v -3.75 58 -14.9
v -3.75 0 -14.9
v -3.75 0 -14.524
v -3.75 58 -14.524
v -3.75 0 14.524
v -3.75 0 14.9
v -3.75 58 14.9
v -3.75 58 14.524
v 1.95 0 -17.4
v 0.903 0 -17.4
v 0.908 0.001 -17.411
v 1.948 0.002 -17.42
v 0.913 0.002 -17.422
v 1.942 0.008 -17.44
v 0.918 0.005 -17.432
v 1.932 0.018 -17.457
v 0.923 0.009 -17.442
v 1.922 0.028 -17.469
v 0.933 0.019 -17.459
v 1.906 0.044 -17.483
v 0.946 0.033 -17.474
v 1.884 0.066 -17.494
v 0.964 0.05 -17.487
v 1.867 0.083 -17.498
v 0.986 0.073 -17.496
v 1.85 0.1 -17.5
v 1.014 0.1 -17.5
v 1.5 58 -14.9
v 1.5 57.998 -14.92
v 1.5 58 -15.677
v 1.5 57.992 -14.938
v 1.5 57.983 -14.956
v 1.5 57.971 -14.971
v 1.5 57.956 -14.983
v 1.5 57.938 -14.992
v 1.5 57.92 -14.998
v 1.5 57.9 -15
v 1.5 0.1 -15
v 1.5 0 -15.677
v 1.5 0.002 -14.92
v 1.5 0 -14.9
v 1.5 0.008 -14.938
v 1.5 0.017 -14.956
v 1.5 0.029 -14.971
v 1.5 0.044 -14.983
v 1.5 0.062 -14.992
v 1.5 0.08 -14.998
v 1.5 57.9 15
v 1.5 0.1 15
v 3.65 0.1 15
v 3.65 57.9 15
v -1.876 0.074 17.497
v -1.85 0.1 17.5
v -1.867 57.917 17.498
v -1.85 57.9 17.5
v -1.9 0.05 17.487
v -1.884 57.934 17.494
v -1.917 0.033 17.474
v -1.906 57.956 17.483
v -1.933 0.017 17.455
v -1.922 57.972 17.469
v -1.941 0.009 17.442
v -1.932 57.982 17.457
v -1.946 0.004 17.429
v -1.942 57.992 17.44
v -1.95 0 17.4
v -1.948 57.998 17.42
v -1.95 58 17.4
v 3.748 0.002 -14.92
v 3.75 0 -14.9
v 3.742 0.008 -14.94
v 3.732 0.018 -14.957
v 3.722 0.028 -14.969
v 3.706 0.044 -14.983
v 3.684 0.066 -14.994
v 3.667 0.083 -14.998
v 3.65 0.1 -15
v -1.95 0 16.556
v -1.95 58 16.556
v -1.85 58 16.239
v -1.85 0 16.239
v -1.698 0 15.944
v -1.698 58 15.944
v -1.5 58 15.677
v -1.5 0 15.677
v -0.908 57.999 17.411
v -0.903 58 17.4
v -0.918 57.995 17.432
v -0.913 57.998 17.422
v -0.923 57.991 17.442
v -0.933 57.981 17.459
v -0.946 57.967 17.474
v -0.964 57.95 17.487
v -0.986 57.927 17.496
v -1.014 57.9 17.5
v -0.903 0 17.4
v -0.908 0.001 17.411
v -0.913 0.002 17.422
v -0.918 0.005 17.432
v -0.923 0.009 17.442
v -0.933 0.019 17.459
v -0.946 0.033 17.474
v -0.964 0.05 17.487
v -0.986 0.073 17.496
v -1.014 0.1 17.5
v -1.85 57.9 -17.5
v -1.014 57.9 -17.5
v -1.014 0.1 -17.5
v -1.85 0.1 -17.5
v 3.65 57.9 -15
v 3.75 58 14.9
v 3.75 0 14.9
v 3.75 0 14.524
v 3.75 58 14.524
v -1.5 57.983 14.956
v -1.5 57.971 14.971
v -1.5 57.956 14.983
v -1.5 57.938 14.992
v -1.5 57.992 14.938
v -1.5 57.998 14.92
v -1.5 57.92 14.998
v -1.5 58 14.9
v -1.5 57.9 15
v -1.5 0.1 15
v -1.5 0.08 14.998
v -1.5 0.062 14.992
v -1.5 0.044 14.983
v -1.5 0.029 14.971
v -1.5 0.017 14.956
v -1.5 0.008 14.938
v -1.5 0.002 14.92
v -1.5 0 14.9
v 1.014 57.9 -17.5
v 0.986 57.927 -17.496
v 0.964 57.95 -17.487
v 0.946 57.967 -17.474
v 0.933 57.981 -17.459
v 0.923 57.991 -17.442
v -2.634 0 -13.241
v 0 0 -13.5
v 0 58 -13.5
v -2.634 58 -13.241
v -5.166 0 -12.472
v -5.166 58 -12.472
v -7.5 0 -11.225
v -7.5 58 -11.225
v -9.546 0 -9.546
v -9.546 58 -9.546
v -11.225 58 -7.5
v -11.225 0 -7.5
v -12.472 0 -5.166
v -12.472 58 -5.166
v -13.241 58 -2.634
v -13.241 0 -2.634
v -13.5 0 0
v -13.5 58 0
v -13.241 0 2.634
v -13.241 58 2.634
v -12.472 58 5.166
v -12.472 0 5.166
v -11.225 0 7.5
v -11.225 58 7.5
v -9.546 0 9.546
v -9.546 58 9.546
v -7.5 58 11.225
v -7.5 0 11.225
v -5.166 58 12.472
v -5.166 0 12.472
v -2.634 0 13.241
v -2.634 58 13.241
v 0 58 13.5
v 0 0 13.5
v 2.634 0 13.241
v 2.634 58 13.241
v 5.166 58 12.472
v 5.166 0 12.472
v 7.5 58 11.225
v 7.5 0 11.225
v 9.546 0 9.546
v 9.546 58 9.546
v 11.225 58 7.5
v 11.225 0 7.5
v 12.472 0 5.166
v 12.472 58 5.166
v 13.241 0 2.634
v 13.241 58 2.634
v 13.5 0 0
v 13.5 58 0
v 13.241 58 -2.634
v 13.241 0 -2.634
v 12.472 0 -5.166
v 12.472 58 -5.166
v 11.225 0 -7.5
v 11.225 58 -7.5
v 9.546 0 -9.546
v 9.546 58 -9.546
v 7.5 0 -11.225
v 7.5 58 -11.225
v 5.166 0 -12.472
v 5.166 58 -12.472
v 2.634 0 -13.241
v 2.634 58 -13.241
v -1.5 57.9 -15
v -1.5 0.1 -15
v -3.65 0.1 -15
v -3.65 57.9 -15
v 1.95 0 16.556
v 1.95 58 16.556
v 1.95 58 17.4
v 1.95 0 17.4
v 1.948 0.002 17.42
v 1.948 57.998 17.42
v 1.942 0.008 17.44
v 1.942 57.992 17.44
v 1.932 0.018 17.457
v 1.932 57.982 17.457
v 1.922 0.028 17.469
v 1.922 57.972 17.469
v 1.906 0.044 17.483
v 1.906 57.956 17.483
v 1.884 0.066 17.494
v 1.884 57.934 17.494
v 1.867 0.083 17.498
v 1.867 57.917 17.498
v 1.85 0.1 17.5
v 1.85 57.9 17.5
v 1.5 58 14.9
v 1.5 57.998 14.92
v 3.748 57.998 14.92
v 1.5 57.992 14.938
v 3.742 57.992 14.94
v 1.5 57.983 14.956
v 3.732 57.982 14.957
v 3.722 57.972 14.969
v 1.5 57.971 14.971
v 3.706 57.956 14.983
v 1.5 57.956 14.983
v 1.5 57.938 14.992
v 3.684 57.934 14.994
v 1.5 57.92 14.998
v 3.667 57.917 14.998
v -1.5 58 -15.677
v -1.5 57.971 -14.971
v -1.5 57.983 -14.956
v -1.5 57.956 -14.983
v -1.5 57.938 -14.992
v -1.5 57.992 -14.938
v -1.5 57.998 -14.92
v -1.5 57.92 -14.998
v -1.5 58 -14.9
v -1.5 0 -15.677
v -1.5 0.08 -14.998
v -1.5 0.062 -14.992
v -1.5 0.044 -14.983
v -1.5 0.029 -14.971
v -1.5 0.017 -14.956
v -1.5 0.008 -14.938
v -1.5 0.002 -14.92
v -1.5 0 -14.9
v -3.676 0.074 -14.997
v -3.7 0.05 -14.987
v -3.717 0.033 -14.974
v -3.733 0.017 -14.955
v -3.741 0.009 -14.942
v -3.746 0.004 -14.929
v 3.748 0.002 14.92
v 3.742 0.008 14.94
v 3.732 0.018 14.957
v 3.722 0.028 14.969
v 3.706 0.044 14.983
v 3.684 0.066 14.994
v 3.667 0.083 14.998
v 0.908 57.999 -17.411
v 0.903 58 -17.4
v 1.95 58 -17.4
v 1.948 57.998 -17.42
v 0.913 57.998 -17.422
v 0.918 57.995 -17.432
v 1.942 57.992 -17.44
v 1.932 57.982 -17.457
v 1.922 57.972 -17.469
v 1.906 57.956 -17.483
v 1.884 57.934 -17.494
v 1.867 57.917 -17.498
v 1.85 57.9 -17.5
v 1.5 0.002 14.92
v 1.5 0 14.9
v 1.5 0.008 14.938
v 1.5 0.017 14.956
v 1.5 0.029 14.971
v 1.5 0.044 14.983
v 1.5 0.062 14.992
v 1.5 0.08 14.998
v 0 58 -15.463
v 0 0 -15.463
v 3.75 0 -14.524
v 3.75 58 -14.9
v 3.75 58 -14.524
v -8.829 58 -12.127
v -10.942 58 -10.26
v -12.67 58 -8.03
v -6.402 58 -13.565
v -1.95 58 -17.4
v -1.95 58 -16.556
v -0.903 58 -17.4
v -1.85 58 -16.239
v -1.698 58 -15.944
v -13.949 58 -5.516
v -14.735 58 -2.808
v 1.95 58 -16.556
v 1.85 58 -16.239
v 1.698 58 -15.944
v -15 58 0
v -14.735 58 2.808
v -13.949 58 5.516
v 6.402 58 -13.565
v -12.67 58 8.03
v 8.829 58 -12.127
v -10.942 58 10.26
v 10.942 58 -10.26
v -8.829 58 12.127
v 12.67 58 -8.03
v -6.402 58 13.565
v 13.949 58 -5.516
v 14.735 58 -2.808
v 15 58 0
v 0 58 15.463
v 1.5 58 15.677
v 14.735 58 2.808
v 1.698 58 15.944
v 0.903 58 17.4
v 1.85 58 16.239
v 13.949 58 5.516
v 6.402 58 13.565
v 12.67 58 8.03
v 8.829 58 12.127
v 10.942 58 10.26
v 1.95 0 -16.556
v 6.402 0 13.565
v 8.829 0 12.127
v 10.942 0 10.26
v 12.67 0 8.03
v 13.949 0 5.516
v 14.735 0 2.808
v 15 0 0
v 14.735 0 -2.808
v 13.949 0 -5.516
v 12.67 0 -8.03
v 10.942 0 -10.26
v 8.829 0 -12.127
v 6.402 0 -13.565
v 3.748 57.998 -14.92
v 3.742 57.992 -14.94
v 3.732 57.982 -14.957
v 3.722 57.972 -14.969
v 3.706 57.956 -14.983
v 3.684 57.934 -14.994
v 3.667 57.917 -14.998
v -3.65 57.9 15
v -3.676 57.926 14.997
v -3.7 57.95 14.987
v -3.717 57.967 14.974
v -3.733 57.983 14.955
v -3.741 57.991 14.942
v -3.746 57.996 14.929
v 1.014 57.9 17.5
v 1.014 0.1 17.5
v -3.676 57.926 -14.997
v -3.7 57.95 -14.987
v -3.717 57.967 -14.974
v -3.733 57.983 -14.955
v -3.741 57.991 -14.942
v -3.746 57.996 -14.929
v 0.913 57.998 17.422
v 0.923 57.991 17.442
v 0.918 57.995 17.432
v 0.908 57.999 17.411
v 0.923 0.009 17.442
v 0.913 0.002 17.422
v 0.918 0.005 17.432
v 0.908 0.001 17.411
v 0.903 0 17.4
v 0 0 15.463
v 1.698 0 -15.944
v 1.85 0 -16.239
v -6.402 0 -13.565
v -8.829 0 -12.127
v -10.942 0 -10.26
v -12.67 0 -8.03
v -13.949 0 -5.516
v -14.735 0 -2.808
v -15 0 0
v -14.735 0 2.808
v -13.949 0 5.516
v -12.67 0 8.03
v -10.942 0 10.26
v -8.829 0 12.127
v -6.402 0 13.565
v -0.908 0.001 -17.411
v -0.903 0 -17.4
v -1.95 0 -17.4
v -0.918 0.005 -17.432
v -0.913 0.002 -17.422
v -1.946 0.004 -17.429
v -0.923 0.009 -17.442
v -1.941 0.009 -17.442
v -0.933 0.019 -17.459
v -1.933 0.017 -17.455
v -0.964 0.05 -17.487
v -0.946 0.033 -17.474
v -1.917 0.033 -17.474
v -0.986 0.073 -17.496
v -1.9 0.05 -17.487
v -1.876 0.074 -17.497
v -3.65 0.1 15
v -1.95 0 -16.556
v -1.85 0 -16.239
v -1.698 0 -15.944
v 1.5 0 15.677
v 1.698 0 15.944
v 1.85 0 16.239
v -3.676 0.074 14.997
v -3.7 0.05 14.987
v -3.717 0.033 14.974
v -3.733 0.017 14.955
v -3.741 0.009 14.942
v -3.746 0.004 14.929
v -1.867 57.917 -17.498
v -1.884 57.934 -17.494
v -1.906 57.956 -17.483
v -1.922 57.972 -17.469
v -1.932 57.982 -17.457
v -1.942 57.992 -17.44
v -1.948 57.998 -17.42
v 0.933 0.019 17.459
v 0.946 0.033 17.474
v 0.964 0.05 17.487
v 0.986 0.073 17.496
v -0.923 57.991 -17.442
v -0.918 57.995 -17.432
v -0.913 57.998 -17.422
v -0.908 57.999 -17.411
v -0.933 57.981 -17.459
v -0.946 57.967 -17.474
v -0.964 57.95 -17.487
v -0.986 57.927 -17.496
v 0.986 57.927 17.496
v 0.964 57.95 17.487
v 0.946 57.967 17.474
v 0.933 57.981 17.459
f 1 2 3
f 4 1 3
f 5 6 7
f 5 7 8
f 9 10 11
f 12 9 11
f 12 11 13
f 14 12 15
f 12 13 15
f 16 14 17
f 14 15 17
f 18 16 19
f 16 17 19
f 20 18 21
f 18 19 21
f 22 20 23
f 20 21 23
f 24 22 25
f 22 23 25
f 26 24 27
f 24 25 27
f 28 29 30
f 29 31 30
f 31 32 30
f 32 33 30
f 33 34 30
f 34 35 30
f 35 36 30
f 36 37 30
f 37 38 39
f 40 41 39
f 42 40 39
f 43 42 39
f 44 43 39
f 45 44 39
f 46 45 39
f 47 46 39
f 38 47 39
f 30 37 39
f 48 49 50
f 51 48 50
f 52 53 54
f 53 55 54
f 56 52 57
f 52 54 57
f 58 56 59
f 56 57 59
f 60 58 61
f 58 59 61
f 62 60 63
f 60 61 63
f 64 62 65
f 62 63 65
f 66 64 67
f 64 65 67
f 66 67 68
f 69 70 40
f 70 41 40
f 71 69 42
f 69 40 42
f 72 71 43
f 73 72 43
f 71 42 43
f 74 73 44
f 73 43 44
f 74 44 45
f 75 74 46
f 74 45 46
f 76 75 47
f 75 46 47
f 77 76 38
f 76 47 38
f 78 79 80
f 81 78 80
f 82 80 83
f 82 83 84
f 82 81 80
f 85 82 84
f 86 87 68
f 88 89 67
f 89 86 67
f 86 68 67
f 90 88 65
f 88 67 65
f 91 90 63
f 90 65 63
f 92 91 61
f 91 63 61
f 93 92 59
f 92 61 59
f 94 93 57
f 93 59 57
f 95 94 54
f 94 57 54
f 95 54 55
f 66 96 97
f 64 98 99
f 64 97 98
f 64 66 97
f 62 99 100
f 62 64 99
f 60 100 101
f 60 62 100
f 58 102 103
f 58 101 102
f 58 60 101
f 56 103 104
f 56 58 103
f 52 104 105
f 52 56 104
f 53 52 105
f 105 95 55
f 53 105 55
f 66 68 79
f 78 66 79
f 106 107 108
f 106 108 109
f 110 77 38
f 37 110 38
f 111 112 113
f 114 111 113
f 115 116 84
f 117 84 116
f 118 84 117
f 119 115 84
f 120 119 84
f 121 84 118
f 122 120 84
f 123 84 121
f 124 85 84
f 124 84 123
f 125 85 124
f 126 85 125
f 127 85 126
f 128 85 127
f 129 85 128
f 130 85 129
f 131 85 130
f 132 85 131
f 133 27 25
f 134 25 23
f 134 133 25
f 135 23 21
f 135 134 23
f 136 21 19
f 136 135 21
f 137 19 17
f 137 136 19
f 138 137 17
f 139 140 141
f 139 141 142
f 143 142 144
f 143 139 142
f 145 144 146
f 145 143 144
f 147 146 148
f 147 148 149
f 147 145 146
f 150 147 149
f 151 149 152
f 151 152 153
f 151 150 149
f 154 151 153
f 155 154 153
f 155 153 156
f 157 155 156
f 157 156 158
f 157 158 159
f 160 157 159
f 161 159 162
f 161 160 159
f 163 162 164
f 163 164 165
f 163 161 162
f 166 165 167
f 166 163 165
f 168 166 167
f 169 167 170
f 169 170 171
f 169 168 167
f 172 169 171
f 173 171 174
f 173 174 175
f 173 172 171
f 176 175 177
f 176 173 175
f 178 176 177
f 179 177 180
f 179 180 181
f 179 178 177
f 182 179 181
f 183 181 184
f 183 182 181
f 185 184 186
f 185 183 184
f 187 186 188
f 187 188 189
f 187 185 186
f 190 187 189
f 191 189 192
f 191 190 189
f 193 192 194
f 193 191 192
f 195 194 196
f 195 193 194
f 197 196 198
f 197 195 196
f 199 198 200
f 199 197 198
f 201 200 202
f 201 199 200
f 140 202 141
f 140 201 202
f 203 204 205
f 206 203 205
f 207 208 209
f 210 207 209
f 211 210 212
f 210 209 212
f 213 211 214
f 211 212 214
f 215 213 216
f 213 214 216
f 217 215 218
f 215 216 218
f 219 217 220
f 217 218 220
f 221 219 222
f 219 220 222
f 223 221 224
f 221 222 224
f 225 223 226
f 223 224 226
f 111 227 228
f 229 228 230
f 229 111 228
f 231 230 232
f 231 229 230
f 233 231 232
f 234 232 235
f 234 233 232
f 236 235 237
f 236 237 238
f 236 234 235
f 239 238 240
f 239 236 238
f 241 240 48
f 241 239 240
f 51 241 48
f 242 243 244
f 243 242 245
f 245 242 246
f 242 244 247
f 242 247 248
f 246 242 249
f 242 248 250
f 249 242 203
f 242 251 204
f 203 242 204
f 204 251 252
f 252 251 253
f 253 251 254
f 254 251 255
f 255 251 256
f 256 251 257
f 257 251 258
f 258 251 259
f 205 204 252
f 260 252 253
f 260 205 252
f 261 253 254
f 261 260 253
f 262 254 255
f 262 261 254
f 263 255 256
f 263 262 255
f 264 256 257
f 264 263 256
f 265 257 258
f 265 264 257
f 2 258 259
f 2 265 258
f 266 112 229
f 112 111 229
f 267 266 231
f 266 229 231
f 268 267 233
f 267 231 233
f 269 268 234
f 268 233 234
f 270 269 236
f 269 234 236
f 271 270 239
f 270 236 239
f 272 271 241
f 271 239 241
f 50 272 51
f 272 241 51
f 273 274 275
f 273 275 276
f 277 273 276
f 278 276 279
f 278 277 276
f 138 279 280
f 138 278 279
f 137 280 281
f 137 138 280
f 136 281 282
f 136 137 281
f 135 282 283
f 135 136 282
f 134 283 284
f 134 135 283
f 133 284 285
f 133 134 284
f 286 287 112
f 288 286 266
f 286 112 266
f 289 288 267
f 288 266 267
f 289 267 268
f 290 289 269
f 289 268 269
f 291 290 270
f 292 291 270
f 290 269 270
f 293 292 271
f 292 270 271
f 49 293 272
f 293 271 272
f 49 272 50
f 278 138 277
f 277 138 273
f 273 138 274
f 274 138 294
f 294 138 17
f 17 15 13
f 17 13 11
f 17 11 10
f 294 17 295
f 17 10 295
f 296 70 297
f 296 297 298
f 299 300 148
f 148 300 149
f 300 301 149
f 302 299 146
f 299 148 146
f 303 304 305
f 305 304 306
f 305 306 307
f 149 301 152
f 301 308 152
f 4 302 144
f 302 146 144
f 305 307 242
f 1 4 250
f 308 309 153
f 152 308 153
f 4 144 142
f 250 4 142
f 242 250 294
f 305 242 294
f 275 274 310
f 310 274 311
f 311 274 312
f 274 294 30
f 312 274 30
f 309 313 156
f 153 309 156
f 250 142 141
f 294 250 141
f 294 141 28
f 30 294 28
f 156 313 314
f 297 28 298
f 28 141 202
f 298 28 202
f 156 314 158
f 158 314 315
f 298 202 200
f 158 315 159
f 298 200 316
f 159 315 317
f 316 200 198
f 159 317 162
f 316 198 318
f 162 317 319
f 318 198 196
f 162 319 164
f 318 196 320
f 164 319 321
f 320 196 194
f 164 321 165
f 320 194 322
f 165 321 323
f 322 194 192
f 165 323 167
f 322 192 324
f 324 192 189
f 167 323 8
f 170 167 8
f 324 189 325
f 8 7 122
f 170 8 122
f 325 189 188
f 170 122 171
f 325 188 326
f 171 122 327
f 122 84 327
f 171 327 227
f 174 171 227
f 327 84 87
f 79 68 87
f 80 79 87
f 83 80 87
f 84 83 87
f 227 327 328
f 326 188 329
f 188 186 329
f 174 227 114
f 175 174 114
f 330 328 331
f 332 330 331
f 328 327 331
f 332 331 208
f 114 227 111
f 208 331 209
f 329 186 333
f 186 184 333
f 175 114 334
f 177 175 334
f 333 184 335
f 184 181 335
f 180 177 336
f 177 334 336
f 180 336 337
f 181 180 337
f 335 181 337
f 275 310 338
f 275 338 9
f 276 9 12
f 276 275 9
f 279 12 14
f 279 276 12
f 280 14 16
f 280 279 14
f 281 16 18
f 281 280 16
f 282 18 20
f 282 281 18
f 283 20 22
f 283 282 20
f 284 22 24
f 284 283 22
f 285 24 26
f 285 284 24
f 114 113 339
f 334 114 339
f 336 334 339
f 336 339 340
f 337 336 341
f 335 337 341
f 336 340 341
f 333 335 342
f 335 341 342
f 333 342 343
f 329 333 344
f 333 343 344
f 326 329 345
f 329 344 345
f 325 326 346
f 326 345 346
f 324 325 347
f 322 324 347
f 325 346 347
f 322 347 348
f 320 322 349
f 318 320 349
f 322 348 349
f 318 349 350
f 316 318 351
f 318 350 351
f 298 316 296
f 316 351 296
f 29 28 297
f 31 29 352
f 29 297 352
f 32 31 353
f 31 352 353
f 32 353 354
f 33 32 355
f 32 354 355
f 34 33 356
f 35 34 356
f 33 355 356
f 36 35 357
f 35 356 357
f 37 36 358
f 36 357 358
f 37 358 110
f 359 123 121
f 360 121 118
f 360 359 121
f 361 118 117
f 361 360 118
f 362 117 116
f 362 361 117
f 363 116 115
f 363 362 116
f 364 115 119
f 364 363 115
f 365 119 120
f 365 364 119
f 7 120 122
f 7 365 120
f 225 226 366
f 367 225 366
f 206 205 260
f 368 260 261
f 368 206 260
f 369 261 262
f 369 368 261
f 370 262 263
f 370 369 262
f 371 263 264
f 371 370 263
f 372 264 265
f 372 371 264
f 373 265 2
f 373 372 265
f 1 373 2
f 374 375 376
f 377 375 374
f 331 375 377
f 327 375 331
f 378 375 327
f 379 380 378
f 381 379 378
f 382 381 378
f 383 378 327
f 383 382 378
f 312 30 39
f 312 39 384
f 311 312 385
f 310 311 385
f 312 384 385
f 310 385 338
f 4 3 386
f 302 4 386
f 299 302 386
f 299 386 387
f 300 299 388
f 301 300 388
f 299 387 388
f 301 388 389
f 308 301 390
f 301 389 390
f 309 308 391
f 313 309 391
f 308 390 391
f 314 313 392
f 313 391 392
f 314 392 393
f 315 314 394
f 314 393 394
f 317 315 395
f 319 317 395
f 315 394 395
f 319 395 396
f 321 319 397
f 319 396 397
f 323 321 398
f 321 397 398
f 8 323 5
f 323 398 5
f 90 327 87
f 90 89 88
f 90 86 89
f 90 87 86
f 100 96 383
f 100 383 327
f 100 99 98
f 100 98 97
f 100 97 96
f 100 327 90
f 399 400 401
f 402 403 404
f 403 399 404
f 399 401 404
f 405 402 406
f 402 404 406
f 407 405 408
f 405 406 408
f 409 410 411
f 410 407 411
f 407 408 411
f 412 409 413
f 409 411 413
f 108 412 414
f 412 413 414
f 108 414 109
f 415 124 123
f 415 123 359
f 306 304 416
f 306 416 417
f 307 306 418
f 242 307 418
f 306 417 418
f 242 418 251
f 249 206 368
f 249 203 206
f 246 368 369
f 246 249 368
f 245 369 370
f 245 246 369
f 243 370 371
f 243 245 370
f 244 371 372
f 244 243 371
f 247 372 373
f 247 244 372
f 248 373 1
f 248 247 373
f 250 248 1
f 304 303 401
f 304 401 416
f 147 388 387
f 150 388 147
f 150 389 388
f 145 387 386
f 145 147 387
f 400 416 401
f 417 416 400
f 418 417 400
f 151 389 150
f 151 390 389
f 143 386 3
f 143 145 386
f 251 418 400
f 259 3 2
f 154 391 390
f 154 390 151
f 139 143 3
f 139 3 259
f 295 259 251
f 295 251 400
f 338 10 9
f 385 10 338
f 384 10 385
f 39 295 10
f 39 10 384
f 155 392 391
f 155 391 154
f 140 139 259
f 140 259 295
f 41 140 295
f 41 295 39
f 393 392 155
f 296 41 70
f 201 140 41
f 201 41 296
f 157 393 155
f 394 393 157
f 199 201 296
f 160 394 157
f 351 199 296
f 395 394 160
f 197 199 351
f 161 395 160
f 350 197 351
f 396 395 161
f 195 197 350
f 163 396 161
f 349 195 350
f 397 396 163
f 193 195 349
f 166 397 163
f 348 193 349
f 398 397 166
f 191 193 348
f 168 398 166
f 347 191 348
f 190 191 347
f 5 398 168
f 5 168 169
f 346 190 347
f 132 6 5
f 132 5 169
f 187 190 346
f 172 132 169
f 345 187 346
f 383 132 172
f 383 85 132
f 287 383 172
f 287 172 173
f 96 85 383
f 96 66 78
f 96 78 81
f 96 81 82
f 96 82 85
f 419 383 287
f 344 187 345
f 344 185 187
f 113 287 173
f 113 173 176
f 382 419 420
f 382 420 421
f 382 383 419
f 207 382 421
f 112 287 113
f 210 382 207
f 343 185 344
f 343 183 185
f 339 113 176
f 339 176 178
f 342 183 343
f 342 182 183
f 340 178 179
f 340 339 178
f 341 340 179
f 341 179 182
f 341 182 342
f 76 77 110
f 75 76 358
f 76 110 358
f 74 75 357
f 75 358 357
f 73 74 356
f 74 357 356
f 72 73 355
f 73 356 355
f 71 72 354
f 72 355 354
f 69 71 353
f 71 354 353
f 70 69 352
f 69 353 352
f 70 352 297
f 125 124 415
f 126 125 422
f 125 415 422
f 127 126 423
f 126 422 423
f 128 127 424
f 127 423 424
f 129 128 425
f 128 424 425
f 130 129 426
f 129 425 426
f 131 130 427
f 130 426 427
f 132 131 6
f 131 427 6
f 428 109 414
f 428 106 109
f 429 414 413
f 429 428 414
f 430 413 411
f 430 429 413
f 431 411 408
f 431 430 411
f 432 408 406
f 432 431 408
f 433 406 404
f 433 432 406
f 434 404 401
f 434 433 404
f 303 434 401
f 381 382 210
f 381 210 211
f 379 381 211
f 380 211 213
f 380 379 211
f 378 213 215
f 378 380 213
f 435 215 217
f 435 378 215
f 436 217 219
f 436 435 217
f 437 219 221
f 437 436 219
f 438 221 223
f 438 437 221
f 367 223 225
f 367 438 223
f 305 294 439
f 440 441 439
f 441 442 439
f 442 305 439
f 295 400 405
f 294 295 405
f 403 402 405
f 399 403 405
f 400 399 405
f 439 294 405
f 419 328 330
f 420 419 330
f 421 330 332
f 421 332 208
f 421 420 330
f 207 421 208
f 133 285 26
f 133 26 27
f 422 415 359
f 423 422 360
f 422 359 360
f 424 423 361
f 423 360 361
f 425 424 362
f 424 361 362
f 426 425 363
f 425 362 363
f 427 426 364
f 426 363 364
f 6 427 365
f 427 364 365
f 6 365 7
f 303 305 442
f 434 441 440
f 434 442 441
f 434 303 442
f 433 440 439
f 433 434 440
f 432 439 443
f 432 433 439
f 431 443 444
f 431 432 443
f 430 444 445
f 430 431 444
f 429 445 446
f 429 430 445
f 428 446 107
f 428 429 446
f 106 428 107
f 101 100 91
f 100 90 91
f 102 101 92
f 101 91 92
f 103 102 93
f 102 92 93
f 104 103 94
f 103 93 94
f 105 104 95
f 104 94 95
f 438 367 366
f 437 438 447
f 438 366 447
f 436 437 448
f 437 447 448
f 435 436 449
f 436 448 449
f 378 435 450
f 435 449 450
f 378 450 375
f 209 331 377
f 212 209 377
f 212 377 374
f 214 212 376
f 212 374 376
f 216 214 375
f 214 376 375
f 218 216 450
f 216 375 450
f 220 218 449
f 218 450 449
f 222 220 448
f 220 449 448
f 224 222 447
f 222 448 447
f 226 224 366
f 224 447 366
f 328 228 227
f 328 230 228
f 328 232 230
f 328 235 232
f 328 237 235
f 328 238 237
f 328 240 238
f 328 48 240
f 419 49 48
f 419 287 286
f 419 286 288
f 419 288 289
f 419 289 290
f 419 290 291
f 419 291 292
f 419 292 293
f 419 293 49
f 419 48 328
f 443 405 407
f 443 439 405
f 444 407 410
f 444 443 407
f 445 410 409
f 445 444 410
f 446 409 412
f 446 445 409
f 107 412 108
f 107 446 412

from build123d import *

# Parameters (mm, degrees)
SKETCH_1_R             = 15
SKETCH_1_R_2           = 13.5
EXTRUDE_1_DEPTH        = 58
EXTRUDE_2_DEPTH        = 58
EXTRUDE_3_DEPTH        = 58
FILLET_1_R             = 0.1
MIRROR_2_COPY_1_DEPTH  = 58
FILLET_1_OF_MIRROR_2_R = 0.1


with BuildPart() as part:
    # 草图1 → 凸台-拉伸1 (new body)
    with BuildSketch(Plane(origin=(0, 0, 0), x_dir=(1, 0, 0), z_dir=(0, 1, 0))):
        with Locations(Location((0, 0, 0), (0, 0, 90))):
            Circle(SKETCH_1_R)
        with Locations(Location((0, 0, 0), (0, 0, 90))):
            Circle(SKETCH_1_R_2, mode=Mode.SUBTRACT)
    extrude(amount=EXTRUDE_1_DEPTH)

    # 草图10 → 凸台-拉伸2 (add)
    with BuildSketch(Plane(origin=(0, 0, 0), x_dir=(1, 0, 0), z_dir=(0, 1, 0))):
        with BuildLine():
            Line((0, 15), (3.75, 15))
            Line((3.75, 15), (3.75, 14.523687548))
            ThreePointArc((3.75, 14.523687548), (1.890064387, 14.880445444), (0, 15))
        make_face()
    extrude_2 = extrude(amount=EXTRUDE_2_DEPTH)

    # 镜向1: 凸台-拉伸2 across plane
    add(extrude_2.mirror(Plane(origin=(0, 0, 0), x_dir=(0, 0, 1), z_dir=(1, 0, 0))))

    # 草图11 → 凸台-拉伸3 (add)
    with BuildSketch(Plane(origin=(0, 0, 0), x_dir=(1, 0, 0), z_dir=(0, 1, 0))):
        with BuildLine():
            Line((-1.5, 15), (1.5, 15))
            Line((1.5, 15), (1.5, 15.677124344))
            ThreePointArc((1.5, 15.677124344), (1.780042303, 16.088161527), (1.95, 16.555590279))
            Line((1.95, 16.555590279), (1.95, 17.5))
            Line((1.95, 17.5), (0.95, 17.5))
            Line((0.95, 17.5), (0, 15.462718426))
            Line((0, 15.462718426), (-0.95, 17.5))
            Line((-0.95, 17.5), (-1.95, 17.5))
            Line((-1.95, 17.5), (-1.95, 16.555590279))
            ThreePointArc((-1.95, 16.555590279), (-1.780042303, 16.088161527), (-1.5, 15.677124344))
            Line((-1.5, 15.677124344), (-1.5, 15))
        make_face()
    extrude_3 = extrude(amount=EXTRUDE_3_DEPTH)

    # 圆角1
    fillet_1_edges = [part.edges().sort_by_distance(p)[0] for p in [
        (-0.95, 29, -17.5),
        (-1.45, 58, -17.5),
        (-1.95, 29, -17.5),
        (-1.45, 0, -17.5),
        (1.95, 29, -17.5),
        (1.45, 58, -17.5),
        (0.95, 29, -17.5),
        (1.45, 0, -17.5),
        (-2.625, 58, -15),
        (-2.625, 0, -15),
        (2.625, 58, -15),
        (2.625, 0, -15),
        (3.75, 29, -15),
        (-3.75, 29, -15),
    ]]
    fillet(fillet_1_edges, radius=FILLET_1_R)

    # 镜向2: 凸台-拉伸2, 凸台-拉伸3 across plane
    add(extrude_2.mirror(Plane.XY))
    add(extrude_3.mirror(Plane.XY))

    # 镜向2 copy 1 sketch → 镜向2 copy 1 (add)
    with BuildSketch(Plane(origin=(0, 0, 0), x_dir=(-1, 0, 0), z_dir=(0, 1, 0))):
        with BuildLine():
            Line((0, 15), (3.75, 15))
            Line((3.75, 15), (3.75, 14.523687548))
            ThreePointArc((3.75, 14.523687548), (1.890064387, 14.880445444), (0, 15))
        make_face()
    extrude(amount=MIRROR_2_COPY_1_DEPTH)

    # 圆角1 of 镜向2
    fillet_1_of_mirror_2_edges = [part.edges().sort_by_distance(p)[0] for p in [
        (-0.95, 29, 17.5),
        (-1.45, 58, 17.5),
        (-1.95, 29, 17.5),
        (-1.45, 0, 17.5),
        (1.95, 29, 17.5),
        (1.45, 58, 17.5),
        (0.95, 29, 17.5),
        (1.45, 0, 17.5),
        (-2.625, 58, 15),
        (-2.625, 0, 15),
        (2.625, 58, 15),
        (2.625, 0, 15),
        (3.75, 29, 15),
        (-3.75, 29, 15),
    ]]
    fillet(fillet_1_of_mirror_2_edges, radius=FILLET_1_OF_MIRROR_2_R)


solid = part.part
